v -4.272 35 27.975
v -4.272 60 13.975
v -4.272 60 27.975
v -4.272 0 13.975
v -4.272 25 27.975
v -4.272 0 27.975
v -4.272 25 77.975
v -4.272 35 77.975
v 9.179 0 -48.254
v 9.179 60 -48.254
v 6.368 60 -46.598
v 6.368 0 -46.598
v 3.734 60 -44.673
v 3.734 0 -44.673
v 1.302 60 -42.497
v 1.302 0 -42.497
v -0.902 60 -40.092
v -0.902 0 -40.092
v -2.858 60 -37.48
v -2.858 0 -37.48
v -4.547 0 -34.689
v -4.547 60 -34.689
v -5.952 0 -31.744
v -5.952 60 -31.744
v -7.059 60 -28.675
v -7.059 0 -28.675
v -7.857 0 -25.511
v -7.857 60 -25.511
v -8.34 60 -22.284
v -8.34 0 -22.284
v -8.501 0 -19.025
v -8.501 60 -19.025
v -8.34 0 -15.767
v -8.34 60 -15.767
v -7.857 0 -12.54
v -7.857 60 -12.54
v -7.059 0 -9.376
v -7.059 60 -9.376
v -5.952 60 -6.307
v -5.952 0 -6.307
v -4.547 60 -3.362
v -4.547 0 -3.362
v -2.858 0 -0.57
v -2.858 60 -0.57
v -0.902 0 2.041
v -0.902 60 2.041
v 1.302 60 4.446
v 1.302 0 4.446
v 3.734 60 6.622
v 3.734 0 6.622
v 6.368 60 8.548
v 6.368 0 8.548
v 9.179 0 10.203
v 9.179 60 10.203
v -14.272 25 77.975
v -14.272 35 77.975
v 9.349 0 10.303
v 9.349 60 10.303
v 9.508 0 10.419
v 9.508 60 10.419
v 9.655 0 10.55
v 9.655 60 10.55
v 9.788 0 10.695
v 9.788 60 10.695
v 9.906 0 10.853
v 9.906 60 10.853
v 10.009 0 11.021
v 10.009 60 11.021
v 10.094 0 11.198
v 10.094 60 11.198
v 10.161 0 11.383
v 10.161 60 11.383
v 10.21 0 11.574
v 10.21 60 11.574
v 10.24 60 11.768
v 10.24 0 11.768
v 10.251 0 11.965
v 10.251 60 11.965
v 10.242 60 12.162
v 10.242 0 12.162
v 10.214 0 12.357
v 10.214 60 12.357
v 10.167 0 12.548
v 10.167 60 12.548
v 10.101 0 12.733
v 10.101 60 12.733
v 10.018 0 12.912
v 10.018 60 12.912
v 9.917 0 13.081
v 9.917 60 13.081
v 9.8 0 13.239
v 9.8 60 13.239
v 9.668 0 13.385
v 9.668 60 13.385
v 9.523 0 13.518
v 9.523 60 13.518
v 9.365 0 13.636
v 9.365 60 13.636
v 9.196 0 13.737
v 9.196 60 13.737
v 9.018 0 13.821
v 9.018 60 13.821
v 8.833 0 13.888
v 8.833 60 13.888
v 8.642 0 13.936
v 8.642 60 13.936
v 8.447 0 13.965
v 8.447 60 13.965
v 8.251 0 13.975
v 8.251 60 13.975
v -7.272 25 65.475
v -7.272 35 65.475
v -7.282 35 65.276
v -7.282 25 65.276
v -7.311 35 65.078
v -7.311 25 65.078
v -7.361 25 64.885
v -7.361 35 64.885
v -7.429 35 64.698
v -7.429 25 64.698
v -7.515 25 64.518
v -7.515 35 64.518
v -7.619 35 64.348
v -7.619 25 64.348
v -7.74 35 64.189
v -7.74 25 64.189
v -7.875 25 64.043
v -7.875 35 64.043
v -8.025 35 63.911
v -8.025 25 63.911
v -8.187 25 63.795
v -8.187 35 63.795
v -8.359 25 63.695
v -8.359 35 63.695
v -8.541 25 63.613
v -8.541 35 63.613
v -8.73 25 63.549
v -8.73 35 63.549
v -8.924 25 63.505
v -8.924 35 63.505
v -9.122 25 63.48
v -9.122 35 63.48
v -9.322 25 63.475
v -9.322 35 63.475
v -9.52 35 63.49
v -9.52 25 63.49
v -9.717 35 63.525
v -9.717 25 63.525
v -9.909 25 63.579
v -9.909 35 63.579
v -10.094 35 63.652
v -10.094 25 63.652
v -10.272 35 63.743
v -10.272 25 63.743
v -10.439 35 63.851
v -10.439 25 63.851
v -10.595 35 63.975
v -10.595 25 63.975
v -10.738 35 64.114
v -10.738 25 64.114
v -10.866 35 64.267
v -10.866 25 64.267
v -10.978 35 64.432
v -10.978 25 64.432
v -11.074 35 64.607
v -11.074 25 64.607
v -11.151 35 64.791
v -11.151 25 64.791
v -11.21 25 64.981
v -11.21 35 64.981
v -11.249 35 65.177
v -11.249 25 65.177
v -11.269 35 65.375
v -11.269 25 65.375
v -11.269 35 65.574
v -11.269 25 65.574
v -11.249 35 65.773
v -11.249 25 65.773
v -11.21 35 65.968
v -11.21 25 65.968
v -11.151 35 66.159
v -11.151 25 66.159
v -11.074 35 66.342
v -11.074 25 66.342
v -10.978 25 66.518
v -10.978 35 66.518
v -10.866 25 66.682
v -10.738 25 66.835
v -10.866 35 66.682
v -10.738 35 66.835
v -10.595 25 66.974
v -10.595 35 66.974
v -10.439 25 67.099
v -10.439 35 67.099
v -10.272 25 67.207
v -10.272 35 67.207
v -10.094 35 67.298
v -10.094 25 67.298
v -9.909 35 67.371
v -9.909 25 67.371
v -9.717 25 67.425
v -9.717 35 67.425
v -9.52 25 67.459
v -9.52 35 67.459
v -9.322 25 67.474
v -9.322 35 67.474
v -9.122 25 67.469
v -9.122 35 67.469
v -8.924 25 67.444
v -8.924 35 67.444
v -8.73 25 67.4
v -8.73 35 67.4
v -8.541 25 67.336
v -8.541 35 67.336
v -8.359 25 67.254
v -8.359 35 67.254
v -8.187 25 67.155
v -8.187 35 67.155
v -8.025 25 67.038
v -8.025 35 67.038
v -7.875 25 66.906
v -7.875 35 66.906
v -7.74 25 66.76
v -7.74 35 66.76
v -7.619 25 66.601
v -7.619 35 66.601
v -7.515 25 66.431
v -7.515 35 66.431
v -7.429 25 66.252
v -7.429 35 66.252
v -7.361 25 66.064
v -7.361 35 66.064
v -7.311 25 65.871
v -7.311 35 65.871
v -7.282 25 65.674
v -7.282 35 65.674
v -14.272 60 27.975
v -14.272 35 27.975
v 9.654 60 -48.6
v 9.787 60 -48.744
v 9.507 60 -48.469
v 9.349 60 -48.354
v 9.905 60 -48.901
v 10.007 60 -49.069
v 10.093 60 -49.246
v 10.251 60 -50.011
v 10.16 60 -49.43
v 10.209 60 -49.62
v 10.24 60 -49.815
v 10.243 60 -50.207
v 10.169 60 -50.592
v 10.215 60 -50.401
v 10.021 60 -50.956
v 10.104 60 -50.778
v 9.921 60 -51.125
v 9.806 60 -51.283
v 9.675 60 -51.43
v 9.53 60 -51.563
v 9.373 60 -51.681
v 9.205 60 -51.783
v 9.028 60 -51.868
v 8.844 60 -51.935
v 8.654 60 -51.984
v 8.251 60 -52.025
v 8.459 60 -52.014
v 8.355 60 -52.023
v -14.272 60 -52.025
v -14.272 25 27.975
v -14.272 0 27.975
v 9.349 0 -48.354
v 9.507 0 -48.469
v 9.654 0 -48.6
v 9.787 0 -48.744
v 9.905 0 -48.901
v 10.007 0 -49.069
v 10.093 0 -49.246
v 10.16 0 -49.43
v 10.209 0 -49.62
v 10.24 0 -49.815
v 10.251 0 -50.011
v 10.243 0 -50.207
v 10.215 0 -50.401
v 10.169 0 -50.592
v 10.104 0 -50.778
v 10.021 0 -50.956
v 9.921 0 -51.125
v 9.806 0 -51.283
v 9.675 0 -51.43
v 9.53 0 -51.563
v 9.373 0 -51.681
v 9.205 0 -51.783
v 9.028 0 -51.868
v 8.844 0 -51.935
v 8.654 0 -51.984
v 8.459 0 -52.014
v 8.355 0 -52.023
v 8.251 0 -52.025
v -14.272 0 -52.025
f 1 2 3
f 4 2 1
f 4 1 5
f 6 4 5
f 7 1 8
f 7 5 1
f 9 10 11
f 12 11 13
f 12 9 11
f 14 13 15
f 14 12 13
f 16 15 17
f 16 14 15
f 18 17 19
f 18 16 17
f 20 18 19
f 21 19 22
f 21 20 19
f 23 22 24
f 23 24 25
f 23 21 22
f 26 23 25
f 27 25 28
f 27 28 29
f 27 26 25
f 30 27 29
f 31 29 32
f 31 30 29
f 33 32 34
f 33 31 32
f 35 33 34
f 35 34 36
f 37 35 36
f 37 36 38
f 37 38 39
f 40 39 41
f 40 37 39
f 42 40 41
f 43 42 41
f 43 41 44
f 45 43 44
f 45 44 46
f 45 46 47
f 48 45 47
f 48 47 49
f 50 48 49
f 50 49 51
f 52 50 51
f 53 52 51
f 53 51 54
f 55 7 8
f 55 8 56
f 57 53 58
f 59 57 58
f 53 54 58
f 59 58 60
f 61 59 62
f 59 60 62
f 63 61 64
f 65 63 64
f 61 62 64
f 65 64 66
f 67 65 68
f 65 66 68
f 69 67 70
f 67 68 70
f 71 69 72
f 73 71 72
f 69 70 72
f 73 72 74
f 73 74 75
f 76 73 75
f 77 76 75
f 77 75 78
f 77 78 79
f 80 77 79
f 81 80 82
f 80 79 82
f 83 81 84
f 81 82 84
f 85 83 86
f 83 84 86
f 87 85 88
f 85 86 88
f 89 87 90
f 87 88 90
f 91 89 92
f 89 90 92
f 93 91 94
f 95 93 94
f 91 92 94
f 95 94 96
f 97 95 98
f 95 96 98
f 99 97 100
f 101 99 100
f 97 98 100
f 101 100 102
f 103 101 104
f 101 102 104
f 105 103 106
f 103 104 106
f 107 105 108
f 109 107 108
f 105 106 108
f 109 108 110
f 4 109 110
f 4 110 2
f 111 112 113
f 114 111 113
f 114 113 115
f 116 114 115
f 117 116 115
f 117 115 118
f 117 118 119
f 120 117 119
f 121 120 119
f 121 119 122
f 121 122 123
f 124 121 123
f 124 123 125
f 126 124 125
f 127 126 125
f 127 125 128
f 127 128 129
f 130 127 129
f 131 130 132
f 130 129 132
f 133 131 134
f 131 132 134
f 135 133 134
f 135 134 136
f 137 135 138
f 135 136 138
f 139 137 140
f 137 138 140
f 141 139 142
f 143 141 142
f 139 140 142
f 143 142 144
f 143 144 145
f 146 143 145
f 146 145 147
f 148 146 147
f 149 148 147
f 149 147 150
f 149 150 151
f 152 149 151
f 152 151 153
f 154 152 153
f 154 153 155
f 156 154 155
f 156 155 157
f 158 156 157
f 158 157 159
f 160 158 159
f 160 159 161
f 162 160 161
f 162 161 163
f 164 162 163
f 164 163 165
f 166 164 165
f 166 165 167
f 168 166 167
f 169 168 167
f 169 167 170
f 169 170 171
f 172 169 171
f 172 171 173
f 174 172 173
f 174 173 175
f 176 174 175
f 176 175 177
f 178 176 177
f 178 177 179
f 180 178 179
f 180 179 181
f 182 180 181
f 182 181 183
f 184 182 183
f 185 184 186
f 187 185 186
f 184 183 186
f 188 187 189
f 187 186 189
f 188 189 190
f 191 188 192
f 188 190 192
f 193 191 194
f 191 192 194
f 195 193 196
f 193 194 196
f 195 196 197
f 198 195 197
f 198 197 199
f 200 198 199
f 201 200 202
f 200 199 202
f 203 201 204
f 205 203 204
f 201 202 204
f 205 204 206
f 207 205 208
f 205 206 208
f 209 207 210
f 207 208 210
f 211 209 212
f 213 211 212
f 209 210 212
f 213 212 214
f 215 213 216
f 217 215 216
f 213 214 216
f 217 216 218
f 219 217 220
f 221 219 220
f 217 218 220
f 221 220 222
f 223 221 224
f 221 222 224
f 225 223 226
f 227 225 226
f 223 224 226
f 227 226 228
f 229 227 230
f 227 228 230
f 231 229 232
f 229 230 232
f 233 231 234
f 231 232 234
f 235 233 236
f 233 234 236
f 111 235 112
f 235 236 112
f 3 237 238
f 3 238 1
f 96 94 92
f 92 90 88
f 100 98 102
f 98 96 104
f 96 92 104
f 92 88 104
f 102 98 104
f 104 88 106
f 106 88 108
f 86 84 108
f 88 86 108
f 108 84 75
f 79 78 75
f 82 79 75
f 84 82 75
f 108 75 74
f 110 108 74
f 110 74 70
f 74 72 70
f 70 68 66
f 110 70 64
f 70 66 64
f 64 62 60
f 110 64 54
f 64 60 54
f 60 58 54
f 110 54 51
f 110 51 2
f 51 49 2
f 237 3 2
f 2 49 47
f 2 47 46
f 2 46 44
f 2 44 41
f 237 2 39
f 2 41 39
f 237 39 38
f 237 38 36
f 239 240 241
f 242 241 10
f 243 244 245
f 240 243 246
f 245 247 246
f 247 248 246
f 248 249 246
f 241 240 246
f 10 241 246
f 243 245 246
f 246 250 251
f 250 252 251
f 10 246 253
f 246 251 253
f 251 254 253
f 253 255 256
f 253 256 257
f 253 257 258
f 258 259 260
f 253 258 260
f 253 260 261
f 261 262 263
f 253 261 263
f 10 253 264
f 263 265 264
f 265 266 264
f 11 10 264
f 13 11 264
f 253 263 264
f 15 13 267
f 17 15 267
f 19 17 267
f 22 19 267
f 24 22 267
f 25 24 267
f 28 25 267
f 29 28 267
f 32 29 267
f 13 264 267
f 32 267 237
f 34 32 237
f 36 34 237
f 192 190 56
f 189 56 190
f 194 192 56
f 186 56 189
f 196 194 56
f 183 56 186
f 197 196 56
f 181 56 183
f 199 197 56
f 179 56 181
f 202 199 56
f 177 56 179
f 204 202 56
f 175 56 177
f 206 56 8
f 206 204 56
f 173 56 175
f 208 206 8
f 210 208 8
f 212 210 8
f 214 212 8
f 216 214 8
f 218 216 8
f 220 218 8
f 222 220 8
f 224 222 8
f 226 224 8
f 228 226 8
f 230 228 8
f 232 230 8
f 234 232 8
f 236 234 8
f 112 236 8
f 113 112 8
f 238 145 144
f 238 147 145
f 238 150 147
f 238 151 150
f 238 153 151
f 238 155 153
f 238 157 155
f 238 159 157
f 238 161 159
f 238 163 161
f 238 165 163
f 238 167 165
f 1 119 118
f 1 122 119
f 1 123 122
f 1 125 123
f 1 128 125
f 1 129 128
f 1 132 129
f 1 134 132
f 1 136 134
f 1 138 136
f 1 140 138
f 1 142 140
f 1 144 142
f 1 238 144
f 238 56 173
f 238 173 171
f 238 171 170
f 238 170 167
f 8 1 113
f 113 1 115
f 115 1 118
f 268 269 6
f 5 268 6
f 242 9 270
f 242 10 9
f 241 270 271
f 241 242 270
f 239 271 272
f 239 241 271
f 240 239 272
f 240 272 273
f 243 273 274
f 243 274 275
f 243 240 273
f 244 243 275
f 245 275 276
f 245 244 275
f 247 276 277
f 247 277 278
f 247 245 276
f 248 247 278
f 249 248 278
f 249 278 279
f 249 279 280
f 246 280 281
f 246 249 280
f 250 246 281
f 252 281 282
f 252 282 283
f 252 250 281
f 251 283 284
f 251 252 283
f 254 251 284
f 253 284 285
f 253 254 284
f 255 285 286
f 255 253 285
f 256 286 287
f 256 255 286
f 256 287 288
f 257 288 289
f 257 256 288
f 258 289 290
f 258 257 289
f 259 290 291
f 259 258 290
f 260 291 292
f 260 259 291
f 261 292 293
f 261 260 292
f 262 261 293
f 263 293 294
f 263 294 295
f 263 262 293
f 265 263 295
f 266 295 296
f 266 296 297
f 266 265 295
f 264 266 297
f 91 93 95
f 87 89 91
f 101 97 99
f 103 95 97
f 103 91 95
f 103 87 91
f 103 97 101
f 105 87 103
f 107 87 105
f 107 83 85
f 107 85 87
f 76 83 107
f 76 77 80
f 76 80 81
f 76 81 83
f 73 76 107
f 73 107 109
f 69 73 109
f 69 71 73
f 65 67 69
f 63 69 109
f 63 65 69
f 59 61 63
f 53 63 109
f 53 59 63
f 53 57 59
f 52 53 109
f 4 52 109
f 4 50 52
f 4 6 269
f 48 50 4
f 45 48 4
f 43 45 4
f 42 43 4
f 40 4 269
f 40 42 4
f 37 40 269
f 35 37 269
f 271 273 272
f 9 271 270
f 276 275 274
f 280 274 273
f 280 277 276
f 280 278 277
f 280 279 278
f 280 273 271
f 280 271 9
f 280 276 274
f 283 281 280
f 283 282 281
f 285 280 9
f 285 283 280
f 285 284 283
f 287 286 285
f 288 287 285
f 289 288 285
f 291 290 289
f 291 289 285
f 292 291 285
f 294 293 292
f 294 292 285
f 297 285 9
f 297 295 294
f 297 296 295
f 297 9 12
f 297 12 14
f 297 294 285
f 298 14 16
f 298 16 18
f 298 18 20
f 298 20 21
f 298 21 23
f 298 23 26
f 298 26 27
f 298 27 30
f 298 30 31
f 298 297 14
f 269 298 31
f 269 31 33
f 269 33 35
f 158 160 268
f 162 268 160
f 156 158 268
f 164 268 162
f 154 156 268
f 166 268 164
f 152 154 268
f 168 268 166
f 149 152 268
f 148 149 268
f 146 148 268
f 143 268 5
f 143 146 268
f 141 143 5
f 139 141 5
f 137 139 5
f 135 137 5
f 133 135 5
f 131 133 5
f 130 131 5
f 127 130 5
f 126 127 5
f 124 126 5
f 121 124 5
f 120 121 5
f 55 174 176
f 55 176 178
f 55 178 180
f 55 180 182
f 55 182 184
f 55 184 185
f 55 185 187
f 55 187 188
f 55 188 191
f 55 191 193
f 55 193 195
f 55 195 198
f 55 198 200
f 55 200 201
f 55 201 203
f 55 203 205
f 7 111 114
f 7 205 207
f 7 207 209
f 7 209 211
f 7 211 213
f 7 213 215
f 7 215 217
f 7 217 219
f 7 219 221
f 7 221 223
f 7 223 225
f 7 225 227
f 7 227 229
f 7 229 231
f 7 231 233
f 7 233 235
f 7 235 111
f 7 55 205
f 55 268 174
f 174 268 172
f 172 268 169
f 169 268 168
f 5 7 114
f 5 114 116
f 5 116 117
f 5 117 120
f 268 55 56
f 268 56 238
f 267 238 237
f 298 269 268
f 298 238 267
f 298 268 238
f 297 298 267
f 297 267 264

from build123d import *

# Parameters (mm, degrees)
BOSS_EXTRUDE1_DEPTH = 60
SKETCH2_W           = 10
SKETCH2_H           = 50
CUT_EXTRUDE1_DEPTH  = 25
SKETCH3_W           = 10
SKETCH3_H           = 50
CUT_EXTRUDE2_DEPTH  = 25
FILLET1_R           = 2
SKETCH4_R           = 2
CUT_EXTRUDE3_DEPTH  = 25


with BuildPart() as part:
    # Sketch1 → Boss-Extrude1 (new body)
    with BuildSketch(Plane(origin=(0, 0, 0), x_dir=(1, 0, 0), z_dir=(0, 1, 0))):
        with BuildLine():
            Line((-4.271755912, 52.025339674), (24.498929667, 52.025339674))
            ThreePointArc((24.498929667, 52.025339674), (-8.501070333, 19.025339674), (24.498929667, -13.974660326))
            Line((24.498929667, -13.974660326), (-4.271755912, -13.974660326))
            Line((-4.271755912, -13.974660326), (-4.271755912, -77.974660326))
            Line((-4.271755912, -77.974660326), (-14.271755912, -77.974660326))
            Line((-14.271755912, -77.974660326), (-14.271755912, 52.025339674))
            Line((-14.271755912, 52.025339674), (-4.271755912, 52.025339674))
        make_face()
    extrude(amount=BOSS_EXTRUDE1_DEPTH)

    # Sketch2 → Cut-Extrude1 (cut)
    with BuildSketch(Plane(origin=(0, 60, 0), x_dir=(1, 0, 0), z_dir=(0, 1, 0))):
        with Locations((-9.271755912, -52.974660326)):
            Rectangle(SKETCH2_W, SKETCH2_H)
    extrude(amount=-CUT_EXTRUDE1_DEPTH, mode=Mode.SUBTRACT)

    # Sketch3 → Cut-Extrude2 (cut)
    with BuildSketch(Plane.XZ):
        with Locations((-9.271755912, 52.974660326)):
            Rectangle(SKETCH3_W, SKETCH3_H)
    extrude(amount=-CUT_EXTRUDE2_DEPTH, mode=Mode.SUBTRACT)

    # Fillet1
    fillet1_edges = [part.edges().sort_by_distance(p)[0] for p in [
        (24.498929667, 30, -52.025339674),
        (24.498929667, 30, 13.974660326),
    ]]
    fillet(fillet1_edges, radius=FILLET1_R)

    # Sketch4 → Cut-Extrude3 (cut)
    with BuildSketch(Plane(origin=(0, 35, 0), x_dir=(1, 0, 0), z_dir=(0, 1, 0))):
        with Locations((-9.271755912, -65.474660326)):
            Circle(SKETCH4_R)
    extrude(amount=-CUT_EXTRUDE3_DEPTH, mode=Mode.SUBTRACT)


solid = part.part
